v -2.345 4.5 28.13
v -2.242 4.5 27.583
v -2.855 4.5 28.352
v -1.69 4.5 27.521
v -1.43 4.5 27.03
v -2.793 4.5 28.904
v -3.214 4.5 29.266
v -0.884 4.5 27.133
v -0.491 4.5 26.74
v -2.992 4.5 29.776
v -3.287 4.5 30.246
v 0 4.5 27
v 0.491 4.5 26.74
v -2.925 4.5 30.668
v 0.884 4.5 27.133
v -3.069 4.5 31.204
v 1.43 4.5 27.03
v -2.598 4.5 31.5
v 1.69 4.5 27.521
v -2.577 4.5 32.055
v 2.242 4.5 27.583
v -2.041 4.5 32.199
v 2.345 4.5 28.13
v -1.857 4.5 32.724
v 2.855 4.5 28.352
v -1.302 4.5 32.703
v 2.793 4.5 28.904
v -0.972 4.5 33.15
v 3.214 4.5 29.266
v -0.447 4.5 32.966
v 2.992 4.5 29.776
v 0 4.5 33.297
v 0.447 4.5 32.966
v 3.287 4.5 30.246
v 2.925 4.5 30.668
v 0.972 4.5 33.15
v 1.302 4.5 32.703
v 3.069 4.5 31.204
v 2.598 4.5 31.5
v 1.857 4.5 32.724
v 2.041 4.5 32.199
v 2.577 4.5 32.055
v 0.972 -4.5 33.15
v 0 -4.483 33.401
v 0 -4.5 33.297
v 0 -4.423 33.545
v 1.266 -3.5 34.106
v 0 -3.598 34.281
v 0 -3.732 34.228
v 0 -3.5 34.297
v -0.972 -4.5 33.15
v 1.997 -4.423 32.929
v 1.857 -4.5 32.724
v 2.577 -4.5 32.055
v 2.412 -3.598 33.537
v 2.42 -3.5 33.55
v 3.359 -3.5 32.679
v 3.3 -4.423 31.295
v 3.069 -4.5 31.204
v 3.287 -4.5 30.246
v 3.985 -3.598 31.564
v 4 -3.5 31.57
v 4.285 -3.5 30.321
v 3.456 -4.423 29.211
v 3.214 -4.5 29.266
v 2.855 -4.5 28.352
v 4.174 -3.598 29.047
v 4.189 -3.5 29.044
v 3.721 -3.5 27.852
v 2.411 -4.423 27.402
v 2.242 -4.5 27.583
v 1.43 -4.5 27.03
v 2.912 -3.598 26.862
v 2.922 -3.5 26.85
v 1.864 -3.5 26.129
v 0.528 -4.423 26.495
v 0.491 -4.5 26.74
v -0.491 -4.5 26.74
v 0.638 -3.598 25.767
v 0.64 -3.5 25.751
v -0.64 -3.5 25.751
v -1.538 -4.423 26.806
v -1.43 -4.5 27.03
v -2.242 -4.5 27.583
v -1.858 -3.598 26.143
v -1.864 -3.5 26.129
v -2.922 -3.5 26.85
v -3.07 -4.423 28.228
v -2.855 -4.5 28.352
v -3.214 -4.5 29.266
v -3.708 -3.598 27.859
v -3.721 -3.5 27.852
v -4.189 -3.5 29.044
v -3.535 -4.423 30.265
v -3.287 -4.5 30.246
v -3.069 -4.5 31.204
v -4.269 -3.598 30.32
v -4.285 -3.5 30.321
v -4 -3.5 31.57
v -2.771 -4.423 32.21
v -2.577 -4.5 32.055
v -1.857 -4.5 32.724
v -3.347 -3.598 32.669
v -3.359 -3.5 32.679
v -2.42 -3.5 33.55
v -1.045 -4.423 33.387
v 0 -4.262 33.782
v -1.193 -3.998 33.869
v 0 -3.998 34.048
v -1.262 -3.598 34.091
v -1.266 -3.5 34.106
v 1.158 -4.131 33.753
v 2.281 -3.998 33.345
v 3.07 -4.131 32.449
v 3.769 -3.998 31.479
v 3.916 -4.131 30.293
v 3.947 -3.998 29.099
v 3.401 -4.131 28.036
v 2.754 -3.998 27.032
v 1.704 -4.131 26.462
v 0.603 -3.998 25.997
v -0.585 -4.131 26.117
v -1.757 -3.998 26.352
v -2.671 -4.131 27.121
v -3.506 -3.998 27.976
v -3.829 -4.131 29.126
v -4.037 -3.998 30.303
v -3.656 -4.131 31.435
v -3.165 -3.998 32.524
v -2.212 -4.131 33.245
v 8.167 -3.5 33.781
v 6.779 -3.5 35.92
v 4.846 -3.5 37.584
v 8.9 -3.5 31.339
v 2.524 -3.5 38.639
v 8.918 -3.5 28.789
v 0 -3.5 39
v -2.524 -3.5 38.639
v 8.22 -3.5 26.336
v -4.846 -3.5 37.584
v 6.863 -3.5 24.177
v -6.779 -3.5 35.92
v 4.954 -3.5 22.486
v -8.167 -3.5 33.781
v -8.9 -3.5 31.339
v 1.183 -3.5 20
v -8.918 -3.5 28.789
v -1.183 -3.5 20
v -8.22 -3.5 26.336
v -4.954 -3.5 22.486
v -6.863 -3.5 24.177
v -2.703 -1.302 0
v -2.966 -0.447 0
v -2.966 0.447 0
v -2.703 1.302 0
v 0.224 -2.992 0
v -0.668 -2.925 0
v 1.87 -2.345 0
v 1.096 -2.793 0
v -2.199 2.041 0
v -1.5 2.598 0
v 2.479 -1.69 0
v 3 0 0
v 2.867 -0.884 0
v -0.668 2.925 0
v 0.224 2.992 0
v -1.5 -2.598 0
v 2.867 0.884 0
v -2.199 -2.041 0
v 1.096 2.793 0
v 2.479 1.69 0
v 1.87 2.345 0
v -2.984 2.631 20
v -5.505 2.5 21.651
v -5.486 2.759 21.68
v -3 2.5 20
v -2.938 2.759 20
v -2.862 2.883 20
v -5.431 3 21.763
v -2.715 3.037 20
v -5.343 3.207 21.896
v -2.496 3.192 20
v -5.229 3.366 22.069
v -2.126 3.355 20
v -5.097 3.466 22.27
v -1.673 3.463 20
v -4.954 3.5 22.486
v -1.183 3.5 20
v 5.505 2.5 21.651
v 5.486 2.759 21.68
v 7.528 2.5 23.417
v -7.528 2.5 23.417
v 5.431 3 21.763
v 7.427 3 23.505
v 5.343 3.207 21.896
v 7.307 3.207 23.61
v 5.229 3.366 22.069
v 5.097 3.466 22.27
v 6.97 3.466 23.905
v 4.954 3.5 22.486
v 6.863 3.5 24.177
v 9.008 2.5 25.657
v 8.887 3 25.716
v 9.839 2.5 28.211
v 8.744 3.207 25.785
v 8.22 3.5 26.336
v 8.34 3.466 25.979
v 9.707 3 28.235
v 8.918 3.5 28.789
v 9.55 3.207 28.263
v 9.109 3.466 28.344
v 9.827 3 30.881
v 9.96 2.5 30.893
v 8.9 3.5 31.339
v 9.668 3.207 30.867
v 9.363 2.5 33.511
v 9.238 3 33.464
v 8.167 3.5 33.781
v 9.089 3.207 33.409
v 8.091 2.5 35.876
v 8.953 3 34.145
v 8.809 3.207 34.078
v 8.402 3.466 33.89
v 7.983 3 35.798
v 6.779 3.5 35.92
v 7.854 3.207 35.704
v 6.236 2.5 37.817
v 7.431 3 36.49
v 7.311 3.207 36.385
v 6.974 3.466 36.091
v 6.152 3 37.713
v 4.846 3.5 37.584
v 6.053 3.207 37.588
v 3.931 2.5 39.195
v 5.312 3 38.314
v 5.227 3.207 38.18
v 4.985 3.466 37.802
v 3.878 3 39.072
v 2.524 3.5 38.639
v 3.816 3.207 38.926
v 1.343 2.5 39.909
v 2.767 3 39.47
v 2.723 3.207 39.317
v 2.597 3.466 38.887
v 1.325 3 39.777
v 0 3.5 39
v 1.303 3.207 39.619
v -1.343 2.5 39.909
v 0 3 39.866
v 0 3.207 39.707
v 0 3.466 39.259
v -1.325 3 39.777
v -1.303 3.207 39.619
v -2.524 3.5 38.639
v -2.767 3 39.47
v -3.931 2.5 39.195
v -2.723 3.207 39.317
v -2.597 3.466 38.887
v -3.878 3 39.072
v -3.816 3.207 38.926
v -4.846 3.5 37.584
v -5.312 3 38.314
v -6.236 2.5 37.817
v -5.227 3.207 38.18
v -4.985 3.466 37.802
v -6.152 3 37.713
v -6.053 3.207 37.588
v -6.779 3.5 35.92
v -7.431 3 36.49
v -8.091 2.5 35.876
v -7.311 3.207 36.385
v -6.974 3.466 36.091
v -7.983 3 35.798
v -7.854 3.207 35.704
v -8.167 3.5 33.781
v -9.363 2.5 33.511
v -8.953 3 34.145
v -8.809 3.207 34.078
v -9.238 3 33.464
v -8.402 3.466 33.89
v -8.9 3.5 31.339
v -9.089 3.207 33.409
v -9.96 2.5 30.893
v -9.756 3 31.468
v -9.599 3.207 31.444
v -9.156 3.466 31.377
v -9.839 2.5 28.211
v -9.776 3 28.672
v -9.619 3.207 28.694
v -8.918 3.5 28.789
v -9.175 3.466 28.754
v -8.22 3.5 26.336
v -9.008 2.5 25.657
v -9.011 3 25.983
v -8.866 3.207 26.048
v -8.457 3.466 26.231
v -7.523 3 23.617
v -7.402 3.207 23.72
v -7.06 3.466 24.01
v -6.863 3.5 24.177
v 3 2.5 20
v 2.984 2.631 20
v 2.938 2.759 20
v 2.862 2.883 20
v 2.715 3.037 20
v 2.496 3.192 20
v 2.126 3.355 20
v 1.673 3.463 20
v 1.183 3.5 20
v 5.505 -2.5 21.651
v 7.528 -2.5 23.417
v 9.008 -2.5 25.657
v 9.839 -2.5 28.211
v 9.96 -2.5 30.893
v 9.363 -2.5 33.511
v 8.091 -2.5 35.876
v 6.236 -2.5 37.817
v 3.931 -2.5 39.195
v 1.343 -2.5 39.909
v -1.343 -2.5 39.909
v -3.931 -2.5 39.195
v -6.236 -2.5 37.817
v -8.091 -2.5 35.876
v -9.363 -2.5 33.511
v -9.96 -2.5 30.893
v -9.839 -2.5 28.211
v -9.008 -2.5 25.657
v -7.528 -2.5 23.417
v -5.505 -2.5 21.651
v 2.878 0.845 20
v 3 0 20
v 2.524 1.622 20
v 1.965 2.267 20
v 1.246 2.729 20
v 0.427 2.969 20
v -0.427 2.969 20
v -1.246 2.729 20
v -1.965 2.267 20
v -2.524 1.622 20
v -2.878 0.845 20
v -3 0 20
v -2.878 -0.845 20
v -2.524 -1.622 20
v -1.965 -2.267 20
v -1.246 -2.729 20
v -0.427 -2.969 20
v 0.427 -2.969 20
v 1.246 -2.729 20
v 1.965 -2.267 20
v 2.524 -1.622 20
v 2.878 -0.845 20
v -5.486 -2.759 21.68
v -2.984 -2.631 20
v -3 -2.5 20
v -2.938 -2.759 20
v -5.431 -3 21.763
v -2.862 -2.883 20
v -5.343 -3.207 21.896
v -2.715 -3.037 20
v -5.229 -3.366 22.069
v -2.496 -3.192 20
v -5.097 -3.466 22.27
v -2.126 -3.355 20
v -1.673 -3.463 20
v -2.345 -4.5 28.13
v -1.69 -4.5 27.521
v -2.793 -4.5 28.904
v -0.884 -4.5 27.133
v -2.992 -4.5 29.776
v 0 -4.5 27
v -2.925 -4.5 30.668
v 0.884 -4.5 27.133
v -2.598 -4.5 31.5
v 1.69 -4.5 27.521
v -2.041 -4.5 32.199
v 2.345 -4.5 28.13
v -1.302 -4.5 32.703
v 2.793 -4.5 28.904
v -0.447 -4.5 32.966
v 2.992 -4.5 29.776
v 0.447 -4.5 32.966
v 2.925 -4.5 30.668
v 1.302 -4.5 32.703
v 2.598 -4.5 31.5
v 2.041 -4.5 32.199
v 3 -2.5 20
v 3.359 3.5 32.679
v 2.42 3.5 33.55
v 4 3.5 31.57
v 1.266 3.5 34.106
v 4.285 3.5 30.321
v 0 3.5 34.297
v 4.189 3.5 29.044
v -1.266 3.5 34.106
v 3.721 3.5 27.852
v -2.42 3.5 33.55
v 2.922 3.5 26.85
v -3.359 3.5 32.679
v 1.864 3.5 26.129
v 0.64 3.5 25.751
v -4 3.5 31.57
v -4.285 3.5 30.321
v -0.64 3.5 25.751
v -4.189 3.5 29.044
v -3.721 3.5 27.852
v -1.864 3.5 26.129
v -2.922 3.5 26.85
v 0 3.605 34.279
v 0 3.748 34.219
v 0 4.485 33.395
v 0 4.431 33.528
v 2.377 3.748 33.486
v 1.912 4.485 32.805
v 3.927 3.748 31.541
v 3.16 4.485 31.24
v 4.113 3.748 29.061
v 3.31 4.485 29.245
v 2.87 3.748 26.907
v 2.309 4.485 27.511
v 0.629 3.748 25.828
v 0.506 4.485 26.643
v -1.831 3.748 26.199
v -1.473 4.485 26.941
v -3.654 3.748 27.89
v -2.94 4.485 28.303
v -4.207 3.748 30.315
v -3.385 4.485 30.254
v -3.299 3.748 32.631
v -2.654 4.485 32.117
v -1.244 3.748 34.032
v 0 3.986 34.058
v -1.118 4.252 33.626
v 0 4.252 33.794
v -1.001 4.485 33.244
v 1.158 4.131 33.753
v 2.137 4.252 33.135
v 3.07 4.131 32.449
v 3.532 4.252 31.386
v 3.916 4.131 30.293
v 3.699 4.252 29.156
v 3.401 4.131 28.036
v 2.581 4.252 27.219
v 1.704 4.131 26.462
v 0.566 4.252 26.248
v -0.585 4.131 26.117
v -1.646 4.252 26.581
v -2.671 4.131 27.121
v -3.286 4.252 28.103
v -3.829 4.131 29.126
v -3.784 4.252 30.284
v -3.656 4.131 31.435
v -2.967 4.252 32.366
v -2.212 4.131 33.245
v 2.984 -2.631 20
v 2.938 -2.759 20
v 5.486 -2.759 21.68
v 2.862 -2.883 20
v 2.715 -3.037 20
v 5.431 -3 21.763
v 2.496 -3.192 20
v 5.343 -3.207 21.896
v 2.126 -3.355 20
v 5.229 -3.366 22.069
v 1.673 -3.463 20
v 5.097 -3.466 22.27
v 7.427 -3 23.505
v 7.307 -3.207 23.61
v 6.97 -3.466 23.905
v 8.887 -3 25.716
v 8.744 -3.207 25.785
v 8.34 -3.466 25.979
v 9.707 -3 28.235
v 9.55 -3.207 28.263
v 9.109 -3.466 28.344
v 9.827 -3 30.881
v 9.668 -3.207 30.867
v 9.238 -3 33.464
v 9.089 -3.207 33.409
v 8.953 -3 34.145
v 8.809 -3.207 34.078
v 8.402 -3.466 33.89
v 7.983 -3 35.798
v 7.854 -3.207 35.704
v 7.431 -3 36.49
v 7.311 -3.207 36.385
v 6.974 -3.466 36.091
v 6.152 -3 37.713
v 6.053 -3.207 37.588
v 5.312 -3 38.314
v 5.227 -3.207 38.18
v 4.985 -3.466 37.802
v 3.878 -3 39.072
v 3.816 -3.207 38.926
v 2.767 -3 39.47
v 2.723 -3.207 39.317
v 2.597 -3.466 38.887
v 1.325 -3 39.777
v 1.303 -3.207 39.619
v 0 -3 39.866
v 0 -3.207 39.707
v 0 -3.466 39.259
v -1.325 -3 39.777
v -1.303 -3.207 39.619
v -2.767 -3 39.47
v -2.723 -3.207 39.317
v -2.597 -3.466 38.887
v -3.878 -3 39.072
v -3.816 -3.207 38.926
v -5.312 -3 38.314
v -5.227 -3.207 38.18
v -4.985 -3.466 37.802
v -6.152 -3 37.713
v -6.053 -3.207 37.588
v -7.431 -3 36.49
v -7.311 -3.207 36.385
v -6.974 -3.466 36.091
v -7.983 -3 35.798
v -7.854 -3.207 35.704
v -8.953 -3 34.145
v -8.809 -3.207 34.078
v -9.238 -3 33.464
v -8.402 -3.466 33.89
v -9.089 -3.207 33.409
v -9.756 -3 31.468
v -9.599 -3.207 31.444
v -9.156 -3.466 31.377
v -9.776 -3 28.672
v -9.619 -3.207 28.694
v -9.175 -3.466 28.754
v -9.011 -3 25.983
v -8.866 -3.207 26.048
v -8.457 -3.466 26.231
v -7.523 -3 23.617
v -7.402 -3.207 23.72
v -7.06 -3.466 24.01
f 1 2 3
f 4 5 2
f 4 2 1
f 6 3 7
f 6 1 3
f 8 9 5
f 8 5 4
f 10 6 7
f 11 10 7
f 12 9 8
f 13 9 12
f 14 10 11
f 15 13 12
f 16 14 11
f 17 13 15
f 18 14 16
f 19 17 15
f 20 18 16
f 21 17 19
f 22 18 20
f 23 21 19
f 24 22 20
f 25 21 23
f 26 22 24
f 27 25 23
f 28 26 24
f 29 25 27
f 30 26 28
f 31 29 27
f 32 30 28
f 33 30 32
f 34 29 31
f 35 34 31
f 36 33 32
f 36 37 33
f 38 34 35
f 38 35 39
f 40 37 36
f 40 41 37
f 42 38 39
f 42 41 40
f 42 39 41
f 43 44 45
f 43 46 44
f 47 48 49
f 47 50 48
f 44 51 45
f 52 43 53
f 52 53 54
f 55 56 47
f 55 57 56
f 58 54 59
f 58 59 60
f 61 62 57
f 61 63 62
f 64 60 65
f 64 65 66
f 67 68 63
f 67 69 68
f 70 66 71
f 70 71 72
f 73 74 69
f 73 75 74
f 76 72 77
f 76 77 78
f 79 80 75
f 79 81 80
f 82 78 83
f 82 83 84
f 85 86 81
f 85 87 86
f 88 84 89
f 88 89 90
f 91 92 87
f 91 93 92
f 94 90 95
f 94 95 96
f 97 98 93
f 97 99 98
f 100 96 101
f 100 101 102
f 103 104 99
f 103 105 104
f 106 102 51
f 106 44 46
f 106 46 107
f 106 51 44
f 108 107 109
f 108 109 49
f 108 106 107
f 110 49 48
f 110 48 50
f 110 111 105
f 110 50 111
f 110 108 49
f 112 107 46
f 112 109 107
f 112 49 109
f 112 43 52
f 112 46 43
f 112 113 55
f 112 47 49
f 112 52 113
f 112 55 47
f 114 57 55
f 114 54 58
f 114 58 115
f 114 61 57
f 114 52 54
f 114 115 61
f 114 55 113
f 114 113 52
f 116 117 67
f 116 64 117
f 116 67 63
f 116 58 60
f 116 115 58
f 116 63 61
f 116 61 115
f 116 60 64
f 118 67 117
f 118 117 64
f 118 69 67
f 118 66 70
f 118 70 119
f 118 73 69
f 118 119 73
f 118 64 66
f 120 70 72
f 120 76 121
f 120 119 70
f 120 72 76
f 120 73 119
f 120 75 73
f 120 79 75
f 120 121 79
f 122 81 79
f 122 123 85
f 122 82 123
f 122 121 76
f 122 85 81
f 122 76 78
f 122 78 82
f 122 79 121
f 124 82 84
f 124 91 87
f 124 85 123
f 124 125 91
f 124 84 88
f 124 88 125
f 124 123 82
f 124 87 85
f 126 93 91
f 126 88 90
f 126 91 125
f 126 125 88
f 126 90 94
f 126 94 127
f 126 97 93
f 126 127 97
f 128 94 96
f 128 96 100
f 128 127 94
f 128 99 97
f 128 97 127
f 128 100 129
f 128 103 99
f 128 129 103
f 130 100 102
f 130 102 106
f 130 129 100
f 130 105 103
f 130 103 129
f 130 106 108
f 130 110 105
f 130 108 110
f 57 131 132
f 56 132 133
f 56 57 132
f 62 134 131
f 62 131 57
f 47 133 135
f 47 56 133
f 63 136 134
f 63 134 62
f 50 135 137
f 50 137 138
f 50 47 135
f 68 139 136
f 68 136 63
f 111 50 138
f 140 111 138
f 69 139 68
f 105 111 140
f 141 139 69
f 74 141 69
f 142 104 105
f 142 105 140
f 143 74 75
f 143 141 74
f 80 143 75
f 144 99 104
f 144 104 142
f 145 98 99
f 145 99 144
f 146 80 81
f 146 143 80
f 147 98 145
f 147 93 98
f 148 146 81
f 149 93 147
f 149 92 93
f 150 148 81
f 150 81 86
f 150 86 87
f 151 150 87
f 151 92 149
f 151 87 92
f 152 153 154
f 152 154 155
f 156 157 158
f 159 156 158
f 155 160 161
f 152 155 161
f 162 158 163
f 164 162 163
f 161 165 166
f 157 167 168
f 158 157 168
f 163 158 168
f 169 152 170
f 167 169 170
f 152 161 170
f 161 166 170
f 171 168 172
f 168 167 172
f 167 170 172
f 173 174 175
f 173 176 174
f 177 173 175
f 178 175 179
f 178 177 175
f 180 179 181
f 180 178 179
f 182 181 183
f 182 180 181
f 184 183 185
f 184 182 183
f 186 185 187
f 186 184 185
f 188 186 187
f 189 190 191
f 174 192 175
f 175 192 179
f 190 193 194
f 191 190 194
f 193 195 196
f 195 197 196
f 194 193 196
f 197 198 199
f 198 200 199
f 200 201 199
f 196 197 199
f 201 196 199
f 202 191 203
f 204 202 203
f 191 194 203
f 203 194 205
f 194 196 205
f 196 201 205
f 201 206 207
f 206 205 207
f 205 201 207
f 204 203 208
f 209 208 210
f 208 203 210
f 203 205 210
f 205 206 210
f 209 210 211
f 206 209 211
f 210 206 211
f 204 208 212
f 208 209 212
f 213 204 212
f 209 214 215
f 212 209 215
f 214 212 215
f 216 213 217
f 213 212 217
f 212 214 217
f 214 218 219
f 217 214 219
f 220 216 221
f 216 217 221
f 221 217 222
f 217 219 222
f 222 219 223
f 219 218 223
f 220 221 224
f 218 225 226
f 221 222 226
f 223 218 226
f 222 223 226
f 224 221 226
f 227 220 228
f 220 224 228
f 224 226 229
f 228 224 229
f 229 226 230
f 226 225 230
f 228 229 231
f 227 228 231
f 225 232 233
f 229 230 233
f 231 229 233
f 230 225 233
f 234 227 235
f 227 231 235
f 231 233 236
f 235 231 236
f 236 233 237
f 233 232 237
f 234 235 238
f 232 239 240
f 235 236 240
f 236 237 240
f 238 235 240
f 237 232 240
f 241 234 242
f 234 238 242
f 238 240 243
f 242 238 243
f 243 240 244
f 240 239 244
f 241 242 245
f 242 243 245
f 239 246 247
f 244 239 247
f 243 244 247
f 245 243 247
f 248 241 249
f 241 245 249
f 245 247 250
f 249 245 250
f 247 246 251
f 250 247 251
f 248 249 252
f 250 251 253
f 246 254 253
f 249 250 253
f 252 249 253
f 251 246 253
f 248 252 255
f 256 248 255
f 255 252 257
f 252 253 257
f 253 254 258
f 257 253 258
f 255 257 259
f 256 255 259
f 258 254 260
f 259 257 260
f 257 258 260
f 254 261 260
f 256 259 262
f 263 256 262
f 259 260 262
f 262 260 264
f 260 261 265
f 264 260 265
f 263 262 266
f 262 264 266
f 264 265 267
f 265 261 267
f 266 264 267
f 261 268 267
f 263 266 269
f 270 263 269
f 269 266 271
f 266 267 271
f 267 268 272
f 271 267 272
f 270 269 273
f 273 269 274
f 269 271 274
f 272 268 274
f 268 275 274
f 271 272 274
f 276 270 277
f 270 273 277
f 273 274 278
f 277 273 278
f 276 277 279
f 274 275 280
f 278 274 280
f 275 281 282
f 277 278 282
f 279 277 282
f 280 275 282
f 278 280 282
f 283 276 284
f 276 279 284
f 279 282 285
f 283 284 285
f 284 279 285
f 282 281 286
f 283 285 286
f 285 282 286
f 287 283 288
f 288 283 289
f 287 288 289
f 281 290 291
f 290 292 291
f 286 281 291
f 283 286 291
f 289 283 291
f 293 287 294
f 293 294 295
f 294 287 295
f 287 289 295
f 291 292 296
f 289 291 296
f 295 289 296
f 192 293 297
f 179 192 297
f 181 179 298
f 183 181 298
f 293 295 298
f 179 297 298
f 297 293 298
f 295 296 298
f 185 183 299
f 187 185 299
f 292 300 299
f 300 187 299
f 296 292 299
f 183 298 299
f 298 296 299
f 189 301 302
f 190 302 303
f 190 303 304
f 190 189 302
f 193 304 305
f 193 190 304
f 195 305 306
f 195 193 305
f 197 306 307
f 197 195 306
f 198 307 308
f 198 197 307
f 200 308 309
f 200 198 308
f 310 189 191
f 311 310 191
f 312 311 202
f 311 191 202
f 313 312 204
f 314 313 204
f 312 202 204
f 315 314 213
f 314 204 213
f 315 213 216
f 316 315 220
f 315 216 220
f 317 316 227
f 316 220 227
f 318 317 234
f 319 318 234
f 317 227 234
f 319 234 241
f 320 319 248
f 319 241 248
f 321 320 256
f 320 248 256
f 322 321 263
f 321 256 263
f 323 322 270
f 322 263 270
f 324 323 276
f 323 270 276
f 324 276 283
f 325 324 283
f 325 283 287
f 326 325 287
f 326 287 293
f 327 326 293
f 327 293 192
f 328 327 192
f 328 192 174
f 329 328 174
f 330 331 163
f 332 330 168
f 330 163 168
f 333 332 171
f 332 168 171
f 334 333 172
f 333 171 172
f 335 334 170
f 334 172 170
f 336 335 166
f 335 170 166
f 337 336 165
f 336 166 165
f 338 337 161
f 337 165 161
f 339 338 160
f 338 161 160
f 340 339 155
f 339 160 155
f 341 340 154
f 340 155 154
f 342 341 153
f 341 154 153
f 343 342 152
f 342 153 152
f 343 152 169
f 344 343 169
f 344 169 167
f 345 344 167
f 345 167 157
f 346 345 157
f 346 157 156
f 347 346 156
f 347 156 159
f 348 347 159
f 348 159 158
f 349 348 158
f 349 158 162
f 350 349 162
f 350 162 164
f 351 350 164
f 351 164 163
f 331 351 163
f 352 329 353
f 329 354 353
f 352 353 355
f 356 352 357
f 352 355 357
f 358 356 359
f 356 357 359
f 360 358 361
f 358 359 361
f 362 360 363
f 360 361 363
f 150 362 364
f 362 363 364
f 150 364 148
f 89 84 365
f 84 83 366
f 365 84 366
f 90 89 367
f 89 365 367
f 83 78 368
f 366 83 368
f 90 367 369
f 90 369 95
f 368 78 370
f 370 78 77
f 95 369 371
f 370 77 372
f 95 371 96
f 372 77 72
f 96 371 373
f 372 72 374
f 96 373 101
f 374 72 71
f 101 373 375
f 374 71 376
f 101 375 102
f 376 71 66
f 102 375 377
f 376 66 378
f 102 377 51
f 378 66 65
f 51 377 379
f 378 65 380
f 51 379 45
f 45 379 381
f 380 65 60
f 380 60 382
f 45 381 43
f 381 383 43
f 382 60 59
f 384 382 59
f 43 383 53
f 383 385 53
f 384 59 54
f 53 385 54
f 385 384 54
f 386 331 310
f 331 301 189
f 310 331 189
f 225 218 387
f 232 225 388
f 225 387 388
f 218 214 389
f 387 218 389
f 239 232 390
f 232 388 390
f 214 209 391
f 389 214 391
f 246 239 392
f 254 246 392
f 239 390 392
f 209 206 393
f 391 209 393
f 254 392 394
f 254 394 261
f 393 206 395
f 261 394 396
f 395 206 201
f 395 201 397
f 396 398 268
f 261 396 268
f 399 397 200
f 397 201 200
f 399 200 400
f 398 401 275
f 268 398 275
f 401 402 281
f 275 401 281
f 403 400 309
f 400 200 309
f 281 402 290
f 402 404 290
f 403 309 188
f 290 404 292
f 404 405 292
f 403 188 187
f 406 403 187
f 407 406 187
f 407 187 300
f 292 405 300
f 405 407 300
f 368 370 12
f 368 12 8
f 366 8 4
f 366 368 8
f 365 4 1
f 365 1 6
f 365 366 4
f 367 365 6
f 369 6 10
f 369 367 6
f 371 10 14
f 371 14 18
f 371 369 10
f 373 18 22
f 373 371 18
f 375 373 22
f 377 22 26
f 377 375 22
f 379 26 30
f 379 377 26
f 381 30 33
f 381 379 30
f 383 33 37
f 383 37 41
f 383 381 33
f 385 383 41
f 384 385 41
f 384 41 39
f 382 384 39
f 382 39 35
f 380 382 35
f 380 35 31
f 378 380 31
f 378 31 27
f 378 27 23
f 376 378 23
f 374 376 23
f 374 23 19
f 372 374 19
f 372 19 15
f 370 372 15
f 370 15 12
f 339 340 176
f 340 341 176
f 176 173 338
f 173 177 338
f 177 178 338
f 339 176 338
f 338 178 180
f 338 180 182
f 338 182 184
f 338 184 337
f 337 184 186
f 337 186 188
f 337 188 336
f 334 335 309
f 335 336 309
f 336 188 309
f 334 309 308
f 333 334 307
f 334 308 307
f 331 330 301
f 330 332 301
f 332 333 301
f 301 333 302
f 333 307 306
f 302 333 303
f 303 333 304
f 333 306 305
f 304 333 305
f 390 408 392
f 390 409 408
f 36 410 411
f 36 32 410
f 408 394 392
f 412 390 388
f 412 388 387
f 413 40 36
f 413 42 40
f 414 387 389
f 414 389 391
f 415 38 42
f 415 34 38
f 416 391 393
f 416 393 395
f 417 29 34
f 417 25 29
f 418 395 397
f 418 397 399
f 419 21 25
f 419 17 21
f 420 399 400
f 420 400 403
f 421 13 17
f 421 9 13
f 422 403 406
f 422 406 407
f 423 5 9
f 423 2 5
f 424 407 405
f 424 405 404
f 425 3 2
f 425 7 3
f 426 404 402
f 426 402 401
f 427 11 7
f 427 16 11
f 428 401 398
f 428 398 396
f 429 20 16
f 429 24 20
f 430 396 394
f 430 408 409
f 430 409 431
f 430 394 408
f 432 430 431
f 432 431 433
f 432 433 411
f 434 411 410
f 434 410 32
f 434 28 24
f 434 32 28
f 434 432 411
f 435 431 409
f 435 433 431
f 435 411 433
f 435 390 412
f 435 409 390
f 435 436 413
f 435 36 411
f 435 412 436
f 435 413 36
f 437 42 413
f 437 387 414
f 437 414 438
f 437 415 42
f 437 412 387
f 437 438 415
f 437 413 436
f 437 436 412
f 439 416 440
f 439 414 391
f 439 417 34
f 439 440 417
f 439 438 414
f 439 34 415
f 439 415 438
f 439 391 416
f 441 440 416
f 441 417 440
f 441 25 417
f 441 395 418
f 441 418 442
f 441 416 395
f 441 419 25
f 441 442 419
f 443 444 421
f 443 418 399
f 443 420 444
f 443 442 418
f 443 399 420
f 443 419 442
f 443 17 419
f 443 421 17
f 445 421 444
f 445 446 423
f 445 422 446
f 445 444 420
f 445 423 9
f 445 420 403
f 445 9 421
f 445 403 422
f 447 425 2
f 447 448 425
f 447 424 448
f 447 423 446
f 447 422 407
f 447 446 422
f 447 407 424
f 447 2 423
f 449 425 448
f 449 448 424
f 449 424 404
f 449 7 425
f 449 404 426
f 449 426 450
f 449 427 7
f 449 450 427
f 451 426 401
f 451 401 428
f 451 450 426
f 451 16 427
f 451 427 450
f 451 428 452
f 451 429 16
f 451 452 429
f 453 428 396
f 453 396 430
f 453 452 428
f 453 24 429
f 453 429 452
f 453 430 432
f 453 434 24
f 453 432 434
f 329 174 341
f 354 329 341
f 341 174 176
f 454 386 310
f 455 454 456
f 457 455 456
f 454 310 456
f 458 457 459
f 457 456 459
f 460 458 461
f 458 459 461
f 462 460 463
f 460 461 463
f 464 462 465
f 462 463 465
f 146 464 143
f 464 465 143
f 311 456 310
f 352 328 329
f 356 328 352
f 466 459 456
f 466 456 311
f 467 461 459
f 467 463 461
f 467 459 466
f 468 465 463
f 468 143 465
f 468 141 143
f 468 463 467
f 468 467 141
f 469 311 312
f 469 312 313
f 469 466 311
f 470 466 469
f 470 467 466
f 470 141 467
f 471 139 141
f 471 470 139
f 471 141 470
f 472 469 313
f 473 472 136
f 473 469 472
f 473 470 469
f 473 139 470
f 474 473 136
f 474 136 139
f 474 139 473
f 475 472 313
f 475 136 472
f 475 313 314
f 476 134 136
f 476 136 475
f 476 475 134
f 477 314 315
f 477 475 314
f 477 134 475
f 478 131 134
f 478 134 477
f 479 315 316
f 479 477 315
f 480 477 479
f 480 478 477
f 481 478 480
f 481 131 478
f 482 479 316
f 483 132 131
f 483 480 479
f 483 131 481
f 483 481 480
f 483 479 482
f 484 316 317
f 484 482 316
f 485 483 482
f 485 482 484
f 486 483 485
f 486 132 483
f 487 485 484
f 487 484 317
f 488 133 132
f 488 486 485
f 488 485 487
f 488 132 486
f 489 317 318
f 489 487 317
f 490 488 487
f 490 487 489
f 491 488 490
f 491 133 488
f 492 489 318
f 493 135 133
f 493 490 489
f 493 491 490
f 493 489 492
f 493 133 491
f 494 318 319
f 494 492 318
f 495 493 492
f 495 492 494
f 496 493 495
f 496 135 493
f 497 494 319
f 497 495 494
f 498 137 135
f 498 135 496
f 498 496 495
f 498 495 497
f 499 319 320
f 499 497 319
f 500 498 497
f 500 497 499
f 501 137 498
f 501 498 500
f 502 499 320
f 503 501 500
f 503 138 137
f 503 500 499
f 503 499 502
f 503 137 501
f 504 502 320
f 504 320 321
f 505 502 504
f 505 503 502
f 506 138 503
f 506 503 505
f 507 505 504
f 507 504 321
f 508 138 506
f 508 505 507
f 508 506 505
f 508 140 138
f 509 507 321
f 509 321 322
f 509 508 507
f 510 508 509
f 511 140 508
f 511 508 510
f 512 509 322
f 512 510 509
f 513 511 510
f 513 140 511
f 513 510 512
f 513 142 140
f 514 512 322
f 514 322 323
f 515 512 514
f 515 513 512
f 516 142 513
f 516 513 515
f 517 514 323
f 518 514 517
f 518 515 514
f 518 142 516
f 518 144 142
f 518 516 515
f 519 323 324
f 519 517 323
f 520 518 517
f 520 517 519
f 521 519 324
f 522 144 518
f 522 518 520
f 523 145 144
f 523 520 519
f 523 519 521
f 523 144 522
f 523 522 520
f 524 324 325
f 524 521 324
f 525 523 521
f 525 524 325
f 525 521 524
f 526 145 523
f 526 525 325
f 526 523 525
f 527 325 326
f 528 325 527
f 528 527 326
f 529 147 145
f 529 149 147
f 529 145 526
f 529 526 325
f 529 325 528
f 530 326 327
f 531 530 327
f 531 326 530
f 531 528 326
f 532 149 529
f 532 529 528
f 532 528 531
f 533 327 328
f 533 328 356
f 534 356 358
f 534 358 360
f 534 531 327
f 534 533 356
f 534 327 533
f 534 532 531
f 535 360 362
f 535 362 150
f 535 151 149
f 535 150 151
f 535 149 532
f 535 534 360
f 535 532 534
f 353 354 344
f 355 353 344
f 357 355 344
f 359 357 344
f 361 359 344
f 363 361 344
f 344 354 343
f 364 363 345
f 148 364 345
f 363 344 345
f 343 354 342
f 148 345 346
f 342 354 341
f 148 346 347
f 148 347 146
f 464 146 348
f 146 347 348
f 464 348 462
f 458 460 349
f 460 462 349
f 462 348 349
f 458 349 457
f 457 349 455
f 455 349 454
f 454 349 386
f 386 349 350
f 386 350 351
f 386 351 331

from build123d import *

# Parameters (mm, degrees)
CROQUIS1_R              = 3
SALIENTE_EXTRUIR1_DEPTH = 20
CROQUIS2_R              = 3
SALIENTE_EXTRUIR2_DEPTH = 3.5
REDONDEO2_R             = 1
CROQUIS3_R              = 4.296610541
CROQUIS3_R_2            = 3
SALIENTE_EXTRUIR3_DEPTH = 4.5
REDONDEO3_SIZE          = 1


with BuildPart() as part:
    # Croquis1 → Saliente-Extruir1 (new body)
    with BuildSketch(Plane.XY):
        Circle(CROQUIS1_R)
    extrude(amount=SALIENTE_EXTRUIR1_DEPTH)

    # Croquis2 → Saliente-Extruir2 (add, symmetric)
    with BuildSketch(Plane(origin=(0, 0, 0), x_dir=(1, 0, 0), z_dir=(0, 1, 0))):
        with BuildLine():
            Line((-5.504587156, -21.651376147), (-3, -20))
            Line((-3, -20), (3, -20))
            Line((3, -20), (5.504587156, -21.651376147))
            ThreePointArc((5.504587156, -21.651376147), (0, -40), (-5.504587156, -21.651376147))
        make_face()
        with Locations(Location((0, -30, 0), (0, 0, 90))):
            Circle(CROQUIS2_R, mode=Mode.SUBTRACT)
    extrude(amount=SALIENTE_EXTRUIR2_DEPTH, both=True)

    # Redondeo2
    redondeo2_edges = [part.edges().sort_by_distance(p)[0] for p in [
        (0, 3.5, 40),
        (4.252293578, 3.5, 20.825688073),
        (-4.252293578, 3.5, 20.825688073),
        (0, -3.5, 40),
        (4.252293578, -3.5, 20.825688073),
        (-4.252293578, -3.5, 20.825688073),
    ]]
    fillet(redondeo2_edges, radius=REDONDEO2_R)

    # Croquis3 → Saliente-Extruir3 (add, symmetric)
    with BuildSketch(Plane(origin=(0, 0, 0), x_dir=(1, 0, 0), z_dir=(0, 1, 0))):
        with Locations(Location((0, -30, 0), (0, 0, 270))):
            Circle(CROQUIS3_R)
        with Locations(Location((0, -30, 0), (0, 0, 90))):
            Circle(CROQUIS3_R_2, mode=Mode.SUBTRACT)
    extrude(amount=SALIENTE_EXTRUIR3_DEPTH, both=True)

    # Redondeo3
    # a fillet whose section is not a circle: 1 mm, written as the material it takes off along each edge
    with BuildSketch(Plane(origin=(0, -4.5, 30), x_dir=(0, 0, 1), z_dir=(-1, 0, 0))) as redondeo3_piece_1:
        with BuildLine():
            Bezier((4.296610541 - REDONDEO3_SIZE, 0), (4.296610541, 0), (4.296610541, REDONDEO3_SIZE), weights=[1, 0.353553391, 1])
            Line((4.296610541, REDONDEO3_SIZE), (4.296610541, 0))
            Line((4.296610541, 0), (4.296610541 - REDONDEO3_SIZE, 0))
        make_face()
    revolve(axis=Axis((0, -4.5, 30), (0, 1, 0)), mode=Mode.SUBTRACT)
    with BuildSketch(Plane(origin=(0, 4.5, 30), x_dir=(0, 0, 1), z_dir=(-1, 0, 0))) as redondeo3_piece_2:
        with BuildLine():
            Bezier((4.296610541, -REDONDEO3_SIZE), (4.296610541, 0), (4.296610541 - REDONDEO3_SIZE, 0), weights=[1, 0.353553391, 1])
            Line((4.296610541 - REDONDEO3_SIZE, 0), (4.296610541, 0))
            Line((4.296610541, 0), (4.296610541, -REDONDEO3_SIZE))
        make_face()
    revolve(axis=Axis((0, 4.5, 30), (0, 1, 0)), mode=Mode.SUBTRACT)


solid = part.part
